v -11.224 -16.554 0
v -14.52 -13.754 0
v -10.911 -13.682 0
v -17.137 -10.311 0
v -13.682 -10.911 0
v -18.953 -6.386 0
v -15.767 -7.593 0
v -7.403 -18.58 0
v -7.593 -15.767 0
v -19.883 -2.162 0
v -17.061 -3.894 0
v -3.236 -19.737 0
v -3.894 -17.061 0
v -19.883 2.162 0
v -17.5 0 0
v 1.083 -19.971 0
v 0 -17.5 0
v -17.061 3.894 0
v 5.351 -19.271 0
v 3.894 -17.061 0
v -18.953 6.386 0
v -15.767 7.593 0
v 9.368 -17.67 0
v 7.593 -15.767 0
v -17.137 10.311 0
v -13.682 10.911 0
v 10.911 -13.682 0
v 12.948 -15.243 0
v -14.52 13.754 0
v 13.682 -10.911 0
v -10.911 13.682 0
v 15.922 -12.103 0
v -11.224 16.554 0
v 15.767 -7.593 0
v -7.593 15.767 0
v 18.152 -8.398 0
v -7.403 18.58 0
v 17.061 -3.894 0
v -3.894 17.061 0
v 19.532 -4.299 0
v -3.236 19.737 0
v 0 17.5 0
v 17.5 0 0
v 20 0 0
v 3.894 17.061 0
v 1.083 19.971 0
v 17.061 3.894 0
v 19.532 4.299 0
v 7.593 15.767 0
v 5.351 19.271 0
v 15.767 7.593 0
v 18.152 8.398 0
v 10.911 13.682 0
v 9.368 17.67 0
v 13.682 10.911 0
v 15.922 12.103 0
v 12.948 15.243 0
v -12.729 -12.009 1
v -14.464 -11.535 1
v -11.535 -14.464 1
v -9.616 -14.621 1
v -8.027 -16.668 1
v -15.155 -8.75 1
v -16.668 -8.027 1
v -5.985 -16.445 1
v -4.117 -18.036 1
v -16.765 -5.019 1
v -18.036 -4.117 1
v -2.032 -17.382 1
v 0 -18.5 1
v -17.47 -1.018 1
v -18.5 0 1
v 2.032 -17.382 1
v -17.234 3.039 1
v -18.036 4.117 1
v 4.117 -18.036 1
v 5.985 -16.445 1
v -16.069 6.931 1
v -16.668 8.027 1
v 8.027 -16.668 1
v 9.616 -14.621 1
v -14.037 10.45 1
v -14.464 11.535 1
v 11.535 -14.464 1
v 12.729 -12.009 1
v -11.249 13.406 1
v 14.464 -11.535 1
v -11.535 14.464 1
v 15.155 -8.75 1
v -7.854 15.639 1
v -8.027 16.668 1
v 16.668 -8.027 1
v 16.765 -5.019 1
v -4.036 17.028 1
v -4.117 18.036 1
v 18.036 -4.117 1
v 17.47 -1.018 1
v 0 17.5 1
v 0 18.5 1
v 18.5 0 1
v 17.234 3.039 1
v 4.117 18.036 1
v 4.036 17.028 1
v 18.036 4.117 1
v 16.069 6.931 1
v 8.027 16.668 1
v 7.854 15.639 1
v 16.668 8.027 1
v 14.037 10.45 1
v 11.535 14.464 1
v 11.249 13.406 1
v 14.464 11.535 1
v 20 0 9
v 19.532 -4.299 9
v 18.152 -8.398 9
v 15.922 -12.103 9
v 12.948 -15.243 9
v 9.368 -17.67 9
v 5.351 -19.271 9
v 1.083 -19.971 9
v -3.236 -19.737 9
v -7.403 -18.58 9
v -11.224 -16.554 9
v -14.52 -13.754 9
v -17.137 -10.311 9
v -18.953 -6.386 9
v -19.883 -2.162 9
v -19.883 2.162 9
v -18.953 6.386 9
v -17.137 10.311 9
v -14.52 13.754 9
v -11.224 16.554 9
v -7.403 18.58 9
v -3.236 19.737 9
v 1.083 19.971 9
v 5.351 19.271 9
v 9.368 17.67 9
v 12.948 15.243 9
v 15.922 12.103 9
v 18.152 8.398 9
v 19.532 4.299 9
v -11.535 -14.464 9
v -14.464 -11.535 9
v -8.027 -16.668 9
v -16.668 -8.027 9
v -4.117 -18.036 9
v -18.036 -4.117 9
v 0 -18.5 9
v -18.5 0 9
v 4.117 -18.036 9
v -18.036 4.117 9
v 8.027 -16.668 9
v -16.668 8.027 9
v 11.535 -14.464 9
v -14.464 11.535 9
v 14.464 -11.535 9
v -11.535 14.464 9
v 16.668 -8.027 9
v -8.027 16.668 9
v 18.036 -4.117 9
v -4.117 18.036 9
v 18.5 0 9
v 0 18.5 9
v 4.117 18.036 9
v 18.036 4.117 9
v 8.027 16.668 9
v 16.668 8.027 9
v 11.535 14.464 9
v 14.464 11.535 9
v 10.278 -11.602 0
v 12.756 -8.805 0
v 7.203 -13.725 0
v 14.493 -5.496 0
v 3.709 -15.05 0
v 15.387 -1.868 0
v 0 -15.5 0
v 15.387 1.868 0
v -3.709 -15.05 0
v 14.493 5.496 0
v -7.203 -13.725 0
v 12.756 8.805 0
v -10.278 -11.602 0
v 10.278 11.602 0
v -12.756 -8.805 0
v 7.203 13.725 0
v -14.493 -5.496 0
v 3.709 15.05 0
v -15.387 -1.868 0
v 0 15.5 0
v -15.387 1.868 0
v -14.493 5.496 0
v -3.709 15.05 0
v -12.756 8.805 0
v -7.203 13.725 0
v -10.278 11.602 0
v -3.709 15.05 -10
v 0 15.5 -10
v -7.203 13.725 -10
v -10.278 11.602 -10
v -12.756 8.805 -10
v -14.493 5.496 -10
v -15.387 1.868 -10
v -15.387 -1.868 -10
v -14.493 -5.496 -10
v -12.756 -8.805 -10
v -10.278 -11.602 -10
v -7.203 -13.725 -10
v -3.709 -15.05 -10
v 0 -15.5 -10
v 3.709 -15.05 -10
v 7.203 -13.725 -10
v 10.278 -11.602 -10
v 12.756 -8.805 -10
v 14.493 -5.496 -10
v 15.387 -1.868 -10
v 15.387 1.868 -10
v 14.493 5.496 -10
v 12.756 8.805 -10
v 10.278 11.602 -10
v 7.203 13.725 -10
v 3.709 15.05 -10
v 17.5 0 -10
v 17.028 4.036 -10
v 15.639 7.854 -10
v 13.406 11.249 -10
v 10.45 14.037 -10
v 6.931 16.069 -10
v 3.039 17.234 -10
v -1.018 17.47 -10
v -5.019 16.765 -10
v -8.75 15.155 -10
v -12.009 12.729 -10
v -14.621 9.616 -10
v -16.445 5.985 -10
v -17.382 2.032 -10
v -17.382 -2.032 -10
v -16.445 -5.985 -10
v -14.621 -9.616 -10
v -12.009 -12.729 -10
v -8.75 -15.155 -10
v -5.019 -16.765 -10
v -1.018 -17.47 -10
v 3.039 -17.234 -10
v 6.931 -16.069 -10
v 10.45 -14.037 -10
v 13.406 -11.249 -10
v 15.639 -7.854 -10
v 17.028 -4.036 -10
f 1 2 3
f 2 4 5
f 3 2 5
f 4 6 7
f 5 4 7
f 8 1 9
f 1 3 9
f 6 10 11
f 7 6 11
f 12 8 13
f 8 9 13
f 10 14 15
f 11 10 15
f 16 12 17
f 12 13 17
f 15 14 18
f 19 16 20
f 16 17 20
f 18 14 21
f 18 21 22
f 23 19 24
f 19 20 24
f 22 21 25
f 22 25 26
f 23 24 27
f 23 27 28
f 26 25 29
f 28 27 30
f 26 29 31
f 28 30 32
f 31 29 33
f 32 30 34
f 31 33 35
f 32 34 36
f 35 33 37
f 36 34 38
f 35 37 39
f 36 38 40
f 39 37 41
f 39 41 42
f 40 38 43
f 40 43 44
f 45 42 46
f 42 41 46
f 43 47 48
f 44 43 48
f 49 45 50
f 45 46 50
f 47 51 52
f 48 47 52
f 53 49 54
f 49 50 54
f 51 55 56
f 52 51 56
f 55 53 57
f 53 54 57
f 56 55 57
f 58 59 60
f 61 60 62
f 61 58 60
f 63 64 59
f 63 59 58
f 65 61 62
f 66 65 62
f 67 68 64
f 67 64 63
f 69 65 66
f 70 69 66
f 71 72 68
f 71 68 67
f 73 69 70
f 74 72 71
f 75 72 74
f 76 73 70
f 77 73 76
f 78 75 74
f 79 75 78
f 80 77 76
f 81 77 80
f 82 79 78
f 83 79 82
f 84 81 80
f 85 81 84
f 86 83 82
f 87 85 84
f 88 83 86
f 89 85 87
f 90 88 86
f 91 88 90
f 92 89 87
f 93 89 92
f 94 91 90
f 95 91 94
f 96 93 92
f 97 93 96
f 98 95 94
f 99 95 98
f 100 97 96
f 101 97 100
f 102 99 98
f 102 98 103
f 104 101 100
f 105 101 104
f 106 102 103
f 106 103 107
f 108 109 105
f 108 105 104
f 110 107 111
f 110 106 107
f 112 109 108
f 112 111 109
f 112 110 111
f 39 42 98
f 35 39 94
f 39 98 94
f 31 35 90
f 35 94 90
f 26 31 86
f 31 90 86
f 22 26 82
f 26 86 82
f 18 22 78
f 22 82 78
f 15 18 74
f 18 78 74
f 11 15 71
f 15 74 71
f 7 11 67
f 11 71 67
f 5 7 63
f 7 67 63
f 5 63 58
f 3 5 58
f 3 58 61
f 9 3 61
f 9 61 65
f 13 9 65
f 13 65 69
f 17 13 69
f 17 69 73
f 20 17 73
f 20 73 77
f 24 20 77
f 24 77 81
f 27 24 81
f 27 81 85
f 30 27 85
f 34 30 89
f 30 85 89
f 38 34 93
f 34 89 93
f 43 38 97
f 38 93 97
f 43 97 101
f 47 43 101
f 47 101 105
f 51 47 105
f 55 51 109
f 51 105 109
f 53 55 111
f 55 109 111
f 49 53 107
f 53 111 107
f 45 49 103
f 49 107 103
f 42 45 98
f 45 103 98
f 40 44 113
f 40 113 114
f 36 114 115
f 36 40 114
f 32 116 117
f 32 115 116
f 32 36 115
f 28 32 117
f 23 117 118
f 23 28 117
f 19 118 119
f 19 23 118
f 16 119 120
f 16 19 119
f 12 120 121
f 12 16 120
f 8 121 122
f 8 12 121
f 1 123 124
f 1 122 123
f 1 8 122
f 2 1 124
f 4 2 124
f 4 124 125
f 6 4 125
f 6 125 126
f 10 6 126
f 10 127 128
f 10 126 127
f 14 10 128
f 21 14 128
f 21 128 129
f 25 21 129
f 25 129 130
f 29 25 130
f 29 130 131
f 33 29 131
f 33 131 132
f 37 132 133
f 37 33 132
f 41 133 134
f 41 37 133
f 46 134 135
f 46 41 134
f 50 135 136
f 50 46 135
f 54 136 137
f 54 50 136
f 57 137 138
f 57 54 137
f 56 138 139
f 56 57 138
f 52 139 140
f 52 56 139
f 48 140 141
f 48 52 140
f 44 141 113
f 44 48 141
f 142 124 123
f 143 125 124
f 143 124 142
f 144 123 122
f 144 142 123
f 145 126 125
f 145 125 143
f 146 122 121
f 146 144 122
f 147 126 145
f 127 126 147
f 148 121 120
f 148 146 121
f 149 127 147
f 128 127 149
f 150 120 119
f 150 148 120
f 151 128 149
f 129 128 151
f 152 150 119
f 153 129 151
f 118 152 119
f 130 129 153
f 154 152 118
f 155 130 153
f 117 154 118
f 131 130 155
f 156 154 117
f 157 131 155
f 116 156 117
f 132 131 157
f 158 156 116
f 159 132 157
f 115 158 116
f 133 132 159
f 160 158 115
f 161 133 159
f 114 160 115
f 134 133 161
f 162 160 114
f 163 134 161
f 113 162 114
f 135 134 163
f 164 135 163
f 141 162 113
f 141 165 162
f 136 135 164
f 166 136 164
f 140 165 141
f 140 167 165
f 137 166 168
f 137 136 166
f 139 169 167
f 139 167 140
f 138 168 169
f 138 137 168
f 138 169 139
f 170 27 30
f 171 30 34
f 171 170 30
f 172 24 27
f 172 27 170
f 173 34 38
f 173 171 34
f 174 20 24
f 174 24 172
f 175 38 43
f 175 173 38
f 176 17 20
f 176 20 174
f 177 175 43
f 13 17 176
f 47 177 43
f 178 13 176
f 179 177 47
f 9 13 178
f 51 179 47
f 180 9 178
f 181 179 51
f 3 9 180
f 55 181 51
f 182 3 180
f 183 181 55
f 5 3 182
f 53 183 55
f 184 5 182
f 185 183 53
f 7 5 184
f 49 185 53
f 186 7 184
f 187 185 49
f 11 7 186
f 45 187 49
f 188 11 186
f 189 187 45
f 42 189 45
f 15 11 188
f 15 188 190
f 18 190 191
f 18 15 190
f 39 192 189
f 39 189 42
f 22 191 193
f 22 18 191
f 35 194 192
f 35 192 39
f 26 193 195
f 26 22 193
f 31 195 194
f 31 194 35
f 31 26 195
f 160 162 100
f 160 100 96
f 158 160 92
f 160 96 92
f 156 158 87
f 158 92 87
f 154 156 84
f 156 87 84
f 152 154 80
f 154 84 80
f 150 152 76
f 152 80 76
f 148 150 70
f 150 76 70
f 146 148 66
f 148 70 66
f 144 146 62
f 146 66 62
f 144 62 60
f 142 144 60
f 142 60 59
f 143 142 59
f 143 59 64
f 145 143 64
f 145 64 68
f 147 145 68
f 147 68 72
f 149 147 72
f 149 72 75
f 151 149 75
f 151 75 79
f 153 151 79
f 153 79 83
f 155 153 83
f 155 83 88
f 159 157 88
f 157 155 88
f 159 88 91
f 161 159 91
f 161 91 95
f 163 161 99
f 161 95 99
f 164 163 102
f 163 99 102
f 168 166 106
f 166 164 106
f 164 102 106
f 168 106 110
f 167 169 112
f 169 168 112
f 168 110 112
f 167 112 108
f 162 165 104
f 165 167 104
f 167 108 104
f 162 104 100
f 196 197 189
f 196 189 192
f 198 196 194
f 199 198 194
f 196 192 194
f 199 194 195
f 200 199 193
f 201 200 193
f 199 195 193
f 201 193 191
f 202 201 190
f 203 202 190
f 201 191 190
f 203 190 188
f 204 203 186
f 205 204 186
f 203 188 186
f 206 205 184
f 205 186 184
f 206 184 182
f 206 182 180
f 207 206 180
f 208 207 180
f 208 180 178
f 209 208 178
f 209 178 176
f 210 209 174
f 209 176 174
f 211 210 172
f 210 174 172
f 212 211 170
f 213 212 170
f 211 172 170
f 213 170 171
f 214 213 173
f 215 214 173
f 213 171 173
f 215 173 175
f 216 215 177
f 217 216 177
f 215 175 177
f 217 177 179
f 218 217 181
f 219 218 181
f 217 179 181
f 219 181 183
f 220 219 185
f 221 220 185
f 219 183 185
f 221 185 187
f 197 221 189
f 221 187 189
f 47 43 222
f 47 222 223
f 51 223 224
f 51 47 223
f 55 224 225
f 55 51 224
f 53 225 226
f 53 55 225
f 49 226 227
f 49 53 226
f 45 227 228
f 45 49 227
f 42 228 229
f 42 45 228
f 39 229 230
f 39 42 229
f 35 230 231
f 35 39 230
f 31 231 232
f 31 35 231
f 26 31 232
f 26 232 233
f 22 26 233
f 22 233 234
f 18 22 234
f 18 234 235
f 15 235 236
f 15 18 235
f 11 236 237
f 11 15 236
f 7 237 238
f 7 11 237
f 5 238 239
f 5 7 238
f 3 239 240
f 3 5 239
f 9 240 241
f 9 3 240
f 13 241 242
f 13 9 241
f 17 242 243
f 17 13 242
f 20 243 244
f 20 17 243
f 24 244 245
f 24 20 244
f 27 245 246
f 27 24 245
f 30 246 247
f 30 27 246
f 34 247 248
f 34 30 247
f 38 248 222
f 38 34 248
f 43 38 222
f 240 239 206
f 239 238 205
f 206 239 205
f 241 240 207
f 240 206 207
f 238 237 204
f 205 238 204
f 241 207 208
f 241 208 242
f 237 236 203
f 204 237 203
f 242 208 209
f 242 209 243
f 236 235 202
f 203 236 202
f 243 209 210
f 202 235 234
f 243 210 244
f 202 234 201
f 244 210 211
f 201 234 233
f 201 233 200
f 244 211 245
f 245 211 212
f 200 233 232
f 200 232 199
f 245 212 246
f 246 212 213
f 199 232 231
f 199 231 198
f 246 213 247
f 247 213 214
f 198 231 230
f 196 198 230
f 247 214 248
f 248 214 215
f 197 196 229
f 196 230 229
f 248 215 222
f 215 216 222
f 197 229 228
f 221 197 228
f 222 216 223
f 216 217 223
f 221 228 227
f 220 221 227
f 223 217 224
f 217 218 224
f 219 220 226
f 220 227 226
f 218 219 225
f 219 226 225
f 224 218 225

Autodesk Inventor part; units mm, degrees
ref_plane "YZ Plane" through (0, 0, 0) normal (1, 0, 0) x (0, 1, 0)
ref_plane "XZ Plane" through (0, 0, 0) normal (0, 1, 0) x (-1, 0, 0)
ref_plane "XY Plane" through (0, 0, 0) normal (0, 0, 1) x (1, 0, 0)
sketch "Sketch1" plane through (0, 0, 0) normal (0, 0, 1) x (1, 0, 0)
  circle A0 centre (0, 0) radius 20
  circle A1 centre (0, 0) radius 18.5
  line L0 (-18.5, 0) -> (18.5, 0)
  circle A2 centre (0, 0) radius 17.5
  dimension "d8" = 40
  dimension "d9" = 35
extrude "Extrusion1" add sketch "Sketch1" along normal blind 9
extrude "Extrusion2" add sketch "Sketch1" against normal blind 10 contours A2 L0 | L0 A2
sketch "Sketch2" plane through (0, 0, -10) normal (0, 0, -1) x (-1, 0, 0)
  point P0 (0, 0)
  point P1 (0, 0)
hole "Hole1" at (0, 0, -10) direction (0, 0, 1) diameter 31 depth 10.25
thread "Thread2" size "M35x1.5" class "6g" standard "ANSI Metric M Profile" full length
extrude "Extrusion3" add sketch "Sketch1" along normal blind 1 contours L0 A2 A1 | A1 L0 A2 | A2 L0 | L0 A2
sketch "Sketch3" plane through (0, 0, 0) normal (0, 0, -1) x (-1, 0, 0)
  point P0 (0, 0)
  point P1 (0, 0)
hole "Hole2" at (0, 0, 0) direction (0, 0, 1) diameter 35 depth 30
sketch "Sketch4" plane through (0, 0, 0) normal (1, 0, 0) x (0, 1, 0)
  point P0 (0, 0)
properties part number "kaca lampu" material "Aluminum 6061-AHC"
